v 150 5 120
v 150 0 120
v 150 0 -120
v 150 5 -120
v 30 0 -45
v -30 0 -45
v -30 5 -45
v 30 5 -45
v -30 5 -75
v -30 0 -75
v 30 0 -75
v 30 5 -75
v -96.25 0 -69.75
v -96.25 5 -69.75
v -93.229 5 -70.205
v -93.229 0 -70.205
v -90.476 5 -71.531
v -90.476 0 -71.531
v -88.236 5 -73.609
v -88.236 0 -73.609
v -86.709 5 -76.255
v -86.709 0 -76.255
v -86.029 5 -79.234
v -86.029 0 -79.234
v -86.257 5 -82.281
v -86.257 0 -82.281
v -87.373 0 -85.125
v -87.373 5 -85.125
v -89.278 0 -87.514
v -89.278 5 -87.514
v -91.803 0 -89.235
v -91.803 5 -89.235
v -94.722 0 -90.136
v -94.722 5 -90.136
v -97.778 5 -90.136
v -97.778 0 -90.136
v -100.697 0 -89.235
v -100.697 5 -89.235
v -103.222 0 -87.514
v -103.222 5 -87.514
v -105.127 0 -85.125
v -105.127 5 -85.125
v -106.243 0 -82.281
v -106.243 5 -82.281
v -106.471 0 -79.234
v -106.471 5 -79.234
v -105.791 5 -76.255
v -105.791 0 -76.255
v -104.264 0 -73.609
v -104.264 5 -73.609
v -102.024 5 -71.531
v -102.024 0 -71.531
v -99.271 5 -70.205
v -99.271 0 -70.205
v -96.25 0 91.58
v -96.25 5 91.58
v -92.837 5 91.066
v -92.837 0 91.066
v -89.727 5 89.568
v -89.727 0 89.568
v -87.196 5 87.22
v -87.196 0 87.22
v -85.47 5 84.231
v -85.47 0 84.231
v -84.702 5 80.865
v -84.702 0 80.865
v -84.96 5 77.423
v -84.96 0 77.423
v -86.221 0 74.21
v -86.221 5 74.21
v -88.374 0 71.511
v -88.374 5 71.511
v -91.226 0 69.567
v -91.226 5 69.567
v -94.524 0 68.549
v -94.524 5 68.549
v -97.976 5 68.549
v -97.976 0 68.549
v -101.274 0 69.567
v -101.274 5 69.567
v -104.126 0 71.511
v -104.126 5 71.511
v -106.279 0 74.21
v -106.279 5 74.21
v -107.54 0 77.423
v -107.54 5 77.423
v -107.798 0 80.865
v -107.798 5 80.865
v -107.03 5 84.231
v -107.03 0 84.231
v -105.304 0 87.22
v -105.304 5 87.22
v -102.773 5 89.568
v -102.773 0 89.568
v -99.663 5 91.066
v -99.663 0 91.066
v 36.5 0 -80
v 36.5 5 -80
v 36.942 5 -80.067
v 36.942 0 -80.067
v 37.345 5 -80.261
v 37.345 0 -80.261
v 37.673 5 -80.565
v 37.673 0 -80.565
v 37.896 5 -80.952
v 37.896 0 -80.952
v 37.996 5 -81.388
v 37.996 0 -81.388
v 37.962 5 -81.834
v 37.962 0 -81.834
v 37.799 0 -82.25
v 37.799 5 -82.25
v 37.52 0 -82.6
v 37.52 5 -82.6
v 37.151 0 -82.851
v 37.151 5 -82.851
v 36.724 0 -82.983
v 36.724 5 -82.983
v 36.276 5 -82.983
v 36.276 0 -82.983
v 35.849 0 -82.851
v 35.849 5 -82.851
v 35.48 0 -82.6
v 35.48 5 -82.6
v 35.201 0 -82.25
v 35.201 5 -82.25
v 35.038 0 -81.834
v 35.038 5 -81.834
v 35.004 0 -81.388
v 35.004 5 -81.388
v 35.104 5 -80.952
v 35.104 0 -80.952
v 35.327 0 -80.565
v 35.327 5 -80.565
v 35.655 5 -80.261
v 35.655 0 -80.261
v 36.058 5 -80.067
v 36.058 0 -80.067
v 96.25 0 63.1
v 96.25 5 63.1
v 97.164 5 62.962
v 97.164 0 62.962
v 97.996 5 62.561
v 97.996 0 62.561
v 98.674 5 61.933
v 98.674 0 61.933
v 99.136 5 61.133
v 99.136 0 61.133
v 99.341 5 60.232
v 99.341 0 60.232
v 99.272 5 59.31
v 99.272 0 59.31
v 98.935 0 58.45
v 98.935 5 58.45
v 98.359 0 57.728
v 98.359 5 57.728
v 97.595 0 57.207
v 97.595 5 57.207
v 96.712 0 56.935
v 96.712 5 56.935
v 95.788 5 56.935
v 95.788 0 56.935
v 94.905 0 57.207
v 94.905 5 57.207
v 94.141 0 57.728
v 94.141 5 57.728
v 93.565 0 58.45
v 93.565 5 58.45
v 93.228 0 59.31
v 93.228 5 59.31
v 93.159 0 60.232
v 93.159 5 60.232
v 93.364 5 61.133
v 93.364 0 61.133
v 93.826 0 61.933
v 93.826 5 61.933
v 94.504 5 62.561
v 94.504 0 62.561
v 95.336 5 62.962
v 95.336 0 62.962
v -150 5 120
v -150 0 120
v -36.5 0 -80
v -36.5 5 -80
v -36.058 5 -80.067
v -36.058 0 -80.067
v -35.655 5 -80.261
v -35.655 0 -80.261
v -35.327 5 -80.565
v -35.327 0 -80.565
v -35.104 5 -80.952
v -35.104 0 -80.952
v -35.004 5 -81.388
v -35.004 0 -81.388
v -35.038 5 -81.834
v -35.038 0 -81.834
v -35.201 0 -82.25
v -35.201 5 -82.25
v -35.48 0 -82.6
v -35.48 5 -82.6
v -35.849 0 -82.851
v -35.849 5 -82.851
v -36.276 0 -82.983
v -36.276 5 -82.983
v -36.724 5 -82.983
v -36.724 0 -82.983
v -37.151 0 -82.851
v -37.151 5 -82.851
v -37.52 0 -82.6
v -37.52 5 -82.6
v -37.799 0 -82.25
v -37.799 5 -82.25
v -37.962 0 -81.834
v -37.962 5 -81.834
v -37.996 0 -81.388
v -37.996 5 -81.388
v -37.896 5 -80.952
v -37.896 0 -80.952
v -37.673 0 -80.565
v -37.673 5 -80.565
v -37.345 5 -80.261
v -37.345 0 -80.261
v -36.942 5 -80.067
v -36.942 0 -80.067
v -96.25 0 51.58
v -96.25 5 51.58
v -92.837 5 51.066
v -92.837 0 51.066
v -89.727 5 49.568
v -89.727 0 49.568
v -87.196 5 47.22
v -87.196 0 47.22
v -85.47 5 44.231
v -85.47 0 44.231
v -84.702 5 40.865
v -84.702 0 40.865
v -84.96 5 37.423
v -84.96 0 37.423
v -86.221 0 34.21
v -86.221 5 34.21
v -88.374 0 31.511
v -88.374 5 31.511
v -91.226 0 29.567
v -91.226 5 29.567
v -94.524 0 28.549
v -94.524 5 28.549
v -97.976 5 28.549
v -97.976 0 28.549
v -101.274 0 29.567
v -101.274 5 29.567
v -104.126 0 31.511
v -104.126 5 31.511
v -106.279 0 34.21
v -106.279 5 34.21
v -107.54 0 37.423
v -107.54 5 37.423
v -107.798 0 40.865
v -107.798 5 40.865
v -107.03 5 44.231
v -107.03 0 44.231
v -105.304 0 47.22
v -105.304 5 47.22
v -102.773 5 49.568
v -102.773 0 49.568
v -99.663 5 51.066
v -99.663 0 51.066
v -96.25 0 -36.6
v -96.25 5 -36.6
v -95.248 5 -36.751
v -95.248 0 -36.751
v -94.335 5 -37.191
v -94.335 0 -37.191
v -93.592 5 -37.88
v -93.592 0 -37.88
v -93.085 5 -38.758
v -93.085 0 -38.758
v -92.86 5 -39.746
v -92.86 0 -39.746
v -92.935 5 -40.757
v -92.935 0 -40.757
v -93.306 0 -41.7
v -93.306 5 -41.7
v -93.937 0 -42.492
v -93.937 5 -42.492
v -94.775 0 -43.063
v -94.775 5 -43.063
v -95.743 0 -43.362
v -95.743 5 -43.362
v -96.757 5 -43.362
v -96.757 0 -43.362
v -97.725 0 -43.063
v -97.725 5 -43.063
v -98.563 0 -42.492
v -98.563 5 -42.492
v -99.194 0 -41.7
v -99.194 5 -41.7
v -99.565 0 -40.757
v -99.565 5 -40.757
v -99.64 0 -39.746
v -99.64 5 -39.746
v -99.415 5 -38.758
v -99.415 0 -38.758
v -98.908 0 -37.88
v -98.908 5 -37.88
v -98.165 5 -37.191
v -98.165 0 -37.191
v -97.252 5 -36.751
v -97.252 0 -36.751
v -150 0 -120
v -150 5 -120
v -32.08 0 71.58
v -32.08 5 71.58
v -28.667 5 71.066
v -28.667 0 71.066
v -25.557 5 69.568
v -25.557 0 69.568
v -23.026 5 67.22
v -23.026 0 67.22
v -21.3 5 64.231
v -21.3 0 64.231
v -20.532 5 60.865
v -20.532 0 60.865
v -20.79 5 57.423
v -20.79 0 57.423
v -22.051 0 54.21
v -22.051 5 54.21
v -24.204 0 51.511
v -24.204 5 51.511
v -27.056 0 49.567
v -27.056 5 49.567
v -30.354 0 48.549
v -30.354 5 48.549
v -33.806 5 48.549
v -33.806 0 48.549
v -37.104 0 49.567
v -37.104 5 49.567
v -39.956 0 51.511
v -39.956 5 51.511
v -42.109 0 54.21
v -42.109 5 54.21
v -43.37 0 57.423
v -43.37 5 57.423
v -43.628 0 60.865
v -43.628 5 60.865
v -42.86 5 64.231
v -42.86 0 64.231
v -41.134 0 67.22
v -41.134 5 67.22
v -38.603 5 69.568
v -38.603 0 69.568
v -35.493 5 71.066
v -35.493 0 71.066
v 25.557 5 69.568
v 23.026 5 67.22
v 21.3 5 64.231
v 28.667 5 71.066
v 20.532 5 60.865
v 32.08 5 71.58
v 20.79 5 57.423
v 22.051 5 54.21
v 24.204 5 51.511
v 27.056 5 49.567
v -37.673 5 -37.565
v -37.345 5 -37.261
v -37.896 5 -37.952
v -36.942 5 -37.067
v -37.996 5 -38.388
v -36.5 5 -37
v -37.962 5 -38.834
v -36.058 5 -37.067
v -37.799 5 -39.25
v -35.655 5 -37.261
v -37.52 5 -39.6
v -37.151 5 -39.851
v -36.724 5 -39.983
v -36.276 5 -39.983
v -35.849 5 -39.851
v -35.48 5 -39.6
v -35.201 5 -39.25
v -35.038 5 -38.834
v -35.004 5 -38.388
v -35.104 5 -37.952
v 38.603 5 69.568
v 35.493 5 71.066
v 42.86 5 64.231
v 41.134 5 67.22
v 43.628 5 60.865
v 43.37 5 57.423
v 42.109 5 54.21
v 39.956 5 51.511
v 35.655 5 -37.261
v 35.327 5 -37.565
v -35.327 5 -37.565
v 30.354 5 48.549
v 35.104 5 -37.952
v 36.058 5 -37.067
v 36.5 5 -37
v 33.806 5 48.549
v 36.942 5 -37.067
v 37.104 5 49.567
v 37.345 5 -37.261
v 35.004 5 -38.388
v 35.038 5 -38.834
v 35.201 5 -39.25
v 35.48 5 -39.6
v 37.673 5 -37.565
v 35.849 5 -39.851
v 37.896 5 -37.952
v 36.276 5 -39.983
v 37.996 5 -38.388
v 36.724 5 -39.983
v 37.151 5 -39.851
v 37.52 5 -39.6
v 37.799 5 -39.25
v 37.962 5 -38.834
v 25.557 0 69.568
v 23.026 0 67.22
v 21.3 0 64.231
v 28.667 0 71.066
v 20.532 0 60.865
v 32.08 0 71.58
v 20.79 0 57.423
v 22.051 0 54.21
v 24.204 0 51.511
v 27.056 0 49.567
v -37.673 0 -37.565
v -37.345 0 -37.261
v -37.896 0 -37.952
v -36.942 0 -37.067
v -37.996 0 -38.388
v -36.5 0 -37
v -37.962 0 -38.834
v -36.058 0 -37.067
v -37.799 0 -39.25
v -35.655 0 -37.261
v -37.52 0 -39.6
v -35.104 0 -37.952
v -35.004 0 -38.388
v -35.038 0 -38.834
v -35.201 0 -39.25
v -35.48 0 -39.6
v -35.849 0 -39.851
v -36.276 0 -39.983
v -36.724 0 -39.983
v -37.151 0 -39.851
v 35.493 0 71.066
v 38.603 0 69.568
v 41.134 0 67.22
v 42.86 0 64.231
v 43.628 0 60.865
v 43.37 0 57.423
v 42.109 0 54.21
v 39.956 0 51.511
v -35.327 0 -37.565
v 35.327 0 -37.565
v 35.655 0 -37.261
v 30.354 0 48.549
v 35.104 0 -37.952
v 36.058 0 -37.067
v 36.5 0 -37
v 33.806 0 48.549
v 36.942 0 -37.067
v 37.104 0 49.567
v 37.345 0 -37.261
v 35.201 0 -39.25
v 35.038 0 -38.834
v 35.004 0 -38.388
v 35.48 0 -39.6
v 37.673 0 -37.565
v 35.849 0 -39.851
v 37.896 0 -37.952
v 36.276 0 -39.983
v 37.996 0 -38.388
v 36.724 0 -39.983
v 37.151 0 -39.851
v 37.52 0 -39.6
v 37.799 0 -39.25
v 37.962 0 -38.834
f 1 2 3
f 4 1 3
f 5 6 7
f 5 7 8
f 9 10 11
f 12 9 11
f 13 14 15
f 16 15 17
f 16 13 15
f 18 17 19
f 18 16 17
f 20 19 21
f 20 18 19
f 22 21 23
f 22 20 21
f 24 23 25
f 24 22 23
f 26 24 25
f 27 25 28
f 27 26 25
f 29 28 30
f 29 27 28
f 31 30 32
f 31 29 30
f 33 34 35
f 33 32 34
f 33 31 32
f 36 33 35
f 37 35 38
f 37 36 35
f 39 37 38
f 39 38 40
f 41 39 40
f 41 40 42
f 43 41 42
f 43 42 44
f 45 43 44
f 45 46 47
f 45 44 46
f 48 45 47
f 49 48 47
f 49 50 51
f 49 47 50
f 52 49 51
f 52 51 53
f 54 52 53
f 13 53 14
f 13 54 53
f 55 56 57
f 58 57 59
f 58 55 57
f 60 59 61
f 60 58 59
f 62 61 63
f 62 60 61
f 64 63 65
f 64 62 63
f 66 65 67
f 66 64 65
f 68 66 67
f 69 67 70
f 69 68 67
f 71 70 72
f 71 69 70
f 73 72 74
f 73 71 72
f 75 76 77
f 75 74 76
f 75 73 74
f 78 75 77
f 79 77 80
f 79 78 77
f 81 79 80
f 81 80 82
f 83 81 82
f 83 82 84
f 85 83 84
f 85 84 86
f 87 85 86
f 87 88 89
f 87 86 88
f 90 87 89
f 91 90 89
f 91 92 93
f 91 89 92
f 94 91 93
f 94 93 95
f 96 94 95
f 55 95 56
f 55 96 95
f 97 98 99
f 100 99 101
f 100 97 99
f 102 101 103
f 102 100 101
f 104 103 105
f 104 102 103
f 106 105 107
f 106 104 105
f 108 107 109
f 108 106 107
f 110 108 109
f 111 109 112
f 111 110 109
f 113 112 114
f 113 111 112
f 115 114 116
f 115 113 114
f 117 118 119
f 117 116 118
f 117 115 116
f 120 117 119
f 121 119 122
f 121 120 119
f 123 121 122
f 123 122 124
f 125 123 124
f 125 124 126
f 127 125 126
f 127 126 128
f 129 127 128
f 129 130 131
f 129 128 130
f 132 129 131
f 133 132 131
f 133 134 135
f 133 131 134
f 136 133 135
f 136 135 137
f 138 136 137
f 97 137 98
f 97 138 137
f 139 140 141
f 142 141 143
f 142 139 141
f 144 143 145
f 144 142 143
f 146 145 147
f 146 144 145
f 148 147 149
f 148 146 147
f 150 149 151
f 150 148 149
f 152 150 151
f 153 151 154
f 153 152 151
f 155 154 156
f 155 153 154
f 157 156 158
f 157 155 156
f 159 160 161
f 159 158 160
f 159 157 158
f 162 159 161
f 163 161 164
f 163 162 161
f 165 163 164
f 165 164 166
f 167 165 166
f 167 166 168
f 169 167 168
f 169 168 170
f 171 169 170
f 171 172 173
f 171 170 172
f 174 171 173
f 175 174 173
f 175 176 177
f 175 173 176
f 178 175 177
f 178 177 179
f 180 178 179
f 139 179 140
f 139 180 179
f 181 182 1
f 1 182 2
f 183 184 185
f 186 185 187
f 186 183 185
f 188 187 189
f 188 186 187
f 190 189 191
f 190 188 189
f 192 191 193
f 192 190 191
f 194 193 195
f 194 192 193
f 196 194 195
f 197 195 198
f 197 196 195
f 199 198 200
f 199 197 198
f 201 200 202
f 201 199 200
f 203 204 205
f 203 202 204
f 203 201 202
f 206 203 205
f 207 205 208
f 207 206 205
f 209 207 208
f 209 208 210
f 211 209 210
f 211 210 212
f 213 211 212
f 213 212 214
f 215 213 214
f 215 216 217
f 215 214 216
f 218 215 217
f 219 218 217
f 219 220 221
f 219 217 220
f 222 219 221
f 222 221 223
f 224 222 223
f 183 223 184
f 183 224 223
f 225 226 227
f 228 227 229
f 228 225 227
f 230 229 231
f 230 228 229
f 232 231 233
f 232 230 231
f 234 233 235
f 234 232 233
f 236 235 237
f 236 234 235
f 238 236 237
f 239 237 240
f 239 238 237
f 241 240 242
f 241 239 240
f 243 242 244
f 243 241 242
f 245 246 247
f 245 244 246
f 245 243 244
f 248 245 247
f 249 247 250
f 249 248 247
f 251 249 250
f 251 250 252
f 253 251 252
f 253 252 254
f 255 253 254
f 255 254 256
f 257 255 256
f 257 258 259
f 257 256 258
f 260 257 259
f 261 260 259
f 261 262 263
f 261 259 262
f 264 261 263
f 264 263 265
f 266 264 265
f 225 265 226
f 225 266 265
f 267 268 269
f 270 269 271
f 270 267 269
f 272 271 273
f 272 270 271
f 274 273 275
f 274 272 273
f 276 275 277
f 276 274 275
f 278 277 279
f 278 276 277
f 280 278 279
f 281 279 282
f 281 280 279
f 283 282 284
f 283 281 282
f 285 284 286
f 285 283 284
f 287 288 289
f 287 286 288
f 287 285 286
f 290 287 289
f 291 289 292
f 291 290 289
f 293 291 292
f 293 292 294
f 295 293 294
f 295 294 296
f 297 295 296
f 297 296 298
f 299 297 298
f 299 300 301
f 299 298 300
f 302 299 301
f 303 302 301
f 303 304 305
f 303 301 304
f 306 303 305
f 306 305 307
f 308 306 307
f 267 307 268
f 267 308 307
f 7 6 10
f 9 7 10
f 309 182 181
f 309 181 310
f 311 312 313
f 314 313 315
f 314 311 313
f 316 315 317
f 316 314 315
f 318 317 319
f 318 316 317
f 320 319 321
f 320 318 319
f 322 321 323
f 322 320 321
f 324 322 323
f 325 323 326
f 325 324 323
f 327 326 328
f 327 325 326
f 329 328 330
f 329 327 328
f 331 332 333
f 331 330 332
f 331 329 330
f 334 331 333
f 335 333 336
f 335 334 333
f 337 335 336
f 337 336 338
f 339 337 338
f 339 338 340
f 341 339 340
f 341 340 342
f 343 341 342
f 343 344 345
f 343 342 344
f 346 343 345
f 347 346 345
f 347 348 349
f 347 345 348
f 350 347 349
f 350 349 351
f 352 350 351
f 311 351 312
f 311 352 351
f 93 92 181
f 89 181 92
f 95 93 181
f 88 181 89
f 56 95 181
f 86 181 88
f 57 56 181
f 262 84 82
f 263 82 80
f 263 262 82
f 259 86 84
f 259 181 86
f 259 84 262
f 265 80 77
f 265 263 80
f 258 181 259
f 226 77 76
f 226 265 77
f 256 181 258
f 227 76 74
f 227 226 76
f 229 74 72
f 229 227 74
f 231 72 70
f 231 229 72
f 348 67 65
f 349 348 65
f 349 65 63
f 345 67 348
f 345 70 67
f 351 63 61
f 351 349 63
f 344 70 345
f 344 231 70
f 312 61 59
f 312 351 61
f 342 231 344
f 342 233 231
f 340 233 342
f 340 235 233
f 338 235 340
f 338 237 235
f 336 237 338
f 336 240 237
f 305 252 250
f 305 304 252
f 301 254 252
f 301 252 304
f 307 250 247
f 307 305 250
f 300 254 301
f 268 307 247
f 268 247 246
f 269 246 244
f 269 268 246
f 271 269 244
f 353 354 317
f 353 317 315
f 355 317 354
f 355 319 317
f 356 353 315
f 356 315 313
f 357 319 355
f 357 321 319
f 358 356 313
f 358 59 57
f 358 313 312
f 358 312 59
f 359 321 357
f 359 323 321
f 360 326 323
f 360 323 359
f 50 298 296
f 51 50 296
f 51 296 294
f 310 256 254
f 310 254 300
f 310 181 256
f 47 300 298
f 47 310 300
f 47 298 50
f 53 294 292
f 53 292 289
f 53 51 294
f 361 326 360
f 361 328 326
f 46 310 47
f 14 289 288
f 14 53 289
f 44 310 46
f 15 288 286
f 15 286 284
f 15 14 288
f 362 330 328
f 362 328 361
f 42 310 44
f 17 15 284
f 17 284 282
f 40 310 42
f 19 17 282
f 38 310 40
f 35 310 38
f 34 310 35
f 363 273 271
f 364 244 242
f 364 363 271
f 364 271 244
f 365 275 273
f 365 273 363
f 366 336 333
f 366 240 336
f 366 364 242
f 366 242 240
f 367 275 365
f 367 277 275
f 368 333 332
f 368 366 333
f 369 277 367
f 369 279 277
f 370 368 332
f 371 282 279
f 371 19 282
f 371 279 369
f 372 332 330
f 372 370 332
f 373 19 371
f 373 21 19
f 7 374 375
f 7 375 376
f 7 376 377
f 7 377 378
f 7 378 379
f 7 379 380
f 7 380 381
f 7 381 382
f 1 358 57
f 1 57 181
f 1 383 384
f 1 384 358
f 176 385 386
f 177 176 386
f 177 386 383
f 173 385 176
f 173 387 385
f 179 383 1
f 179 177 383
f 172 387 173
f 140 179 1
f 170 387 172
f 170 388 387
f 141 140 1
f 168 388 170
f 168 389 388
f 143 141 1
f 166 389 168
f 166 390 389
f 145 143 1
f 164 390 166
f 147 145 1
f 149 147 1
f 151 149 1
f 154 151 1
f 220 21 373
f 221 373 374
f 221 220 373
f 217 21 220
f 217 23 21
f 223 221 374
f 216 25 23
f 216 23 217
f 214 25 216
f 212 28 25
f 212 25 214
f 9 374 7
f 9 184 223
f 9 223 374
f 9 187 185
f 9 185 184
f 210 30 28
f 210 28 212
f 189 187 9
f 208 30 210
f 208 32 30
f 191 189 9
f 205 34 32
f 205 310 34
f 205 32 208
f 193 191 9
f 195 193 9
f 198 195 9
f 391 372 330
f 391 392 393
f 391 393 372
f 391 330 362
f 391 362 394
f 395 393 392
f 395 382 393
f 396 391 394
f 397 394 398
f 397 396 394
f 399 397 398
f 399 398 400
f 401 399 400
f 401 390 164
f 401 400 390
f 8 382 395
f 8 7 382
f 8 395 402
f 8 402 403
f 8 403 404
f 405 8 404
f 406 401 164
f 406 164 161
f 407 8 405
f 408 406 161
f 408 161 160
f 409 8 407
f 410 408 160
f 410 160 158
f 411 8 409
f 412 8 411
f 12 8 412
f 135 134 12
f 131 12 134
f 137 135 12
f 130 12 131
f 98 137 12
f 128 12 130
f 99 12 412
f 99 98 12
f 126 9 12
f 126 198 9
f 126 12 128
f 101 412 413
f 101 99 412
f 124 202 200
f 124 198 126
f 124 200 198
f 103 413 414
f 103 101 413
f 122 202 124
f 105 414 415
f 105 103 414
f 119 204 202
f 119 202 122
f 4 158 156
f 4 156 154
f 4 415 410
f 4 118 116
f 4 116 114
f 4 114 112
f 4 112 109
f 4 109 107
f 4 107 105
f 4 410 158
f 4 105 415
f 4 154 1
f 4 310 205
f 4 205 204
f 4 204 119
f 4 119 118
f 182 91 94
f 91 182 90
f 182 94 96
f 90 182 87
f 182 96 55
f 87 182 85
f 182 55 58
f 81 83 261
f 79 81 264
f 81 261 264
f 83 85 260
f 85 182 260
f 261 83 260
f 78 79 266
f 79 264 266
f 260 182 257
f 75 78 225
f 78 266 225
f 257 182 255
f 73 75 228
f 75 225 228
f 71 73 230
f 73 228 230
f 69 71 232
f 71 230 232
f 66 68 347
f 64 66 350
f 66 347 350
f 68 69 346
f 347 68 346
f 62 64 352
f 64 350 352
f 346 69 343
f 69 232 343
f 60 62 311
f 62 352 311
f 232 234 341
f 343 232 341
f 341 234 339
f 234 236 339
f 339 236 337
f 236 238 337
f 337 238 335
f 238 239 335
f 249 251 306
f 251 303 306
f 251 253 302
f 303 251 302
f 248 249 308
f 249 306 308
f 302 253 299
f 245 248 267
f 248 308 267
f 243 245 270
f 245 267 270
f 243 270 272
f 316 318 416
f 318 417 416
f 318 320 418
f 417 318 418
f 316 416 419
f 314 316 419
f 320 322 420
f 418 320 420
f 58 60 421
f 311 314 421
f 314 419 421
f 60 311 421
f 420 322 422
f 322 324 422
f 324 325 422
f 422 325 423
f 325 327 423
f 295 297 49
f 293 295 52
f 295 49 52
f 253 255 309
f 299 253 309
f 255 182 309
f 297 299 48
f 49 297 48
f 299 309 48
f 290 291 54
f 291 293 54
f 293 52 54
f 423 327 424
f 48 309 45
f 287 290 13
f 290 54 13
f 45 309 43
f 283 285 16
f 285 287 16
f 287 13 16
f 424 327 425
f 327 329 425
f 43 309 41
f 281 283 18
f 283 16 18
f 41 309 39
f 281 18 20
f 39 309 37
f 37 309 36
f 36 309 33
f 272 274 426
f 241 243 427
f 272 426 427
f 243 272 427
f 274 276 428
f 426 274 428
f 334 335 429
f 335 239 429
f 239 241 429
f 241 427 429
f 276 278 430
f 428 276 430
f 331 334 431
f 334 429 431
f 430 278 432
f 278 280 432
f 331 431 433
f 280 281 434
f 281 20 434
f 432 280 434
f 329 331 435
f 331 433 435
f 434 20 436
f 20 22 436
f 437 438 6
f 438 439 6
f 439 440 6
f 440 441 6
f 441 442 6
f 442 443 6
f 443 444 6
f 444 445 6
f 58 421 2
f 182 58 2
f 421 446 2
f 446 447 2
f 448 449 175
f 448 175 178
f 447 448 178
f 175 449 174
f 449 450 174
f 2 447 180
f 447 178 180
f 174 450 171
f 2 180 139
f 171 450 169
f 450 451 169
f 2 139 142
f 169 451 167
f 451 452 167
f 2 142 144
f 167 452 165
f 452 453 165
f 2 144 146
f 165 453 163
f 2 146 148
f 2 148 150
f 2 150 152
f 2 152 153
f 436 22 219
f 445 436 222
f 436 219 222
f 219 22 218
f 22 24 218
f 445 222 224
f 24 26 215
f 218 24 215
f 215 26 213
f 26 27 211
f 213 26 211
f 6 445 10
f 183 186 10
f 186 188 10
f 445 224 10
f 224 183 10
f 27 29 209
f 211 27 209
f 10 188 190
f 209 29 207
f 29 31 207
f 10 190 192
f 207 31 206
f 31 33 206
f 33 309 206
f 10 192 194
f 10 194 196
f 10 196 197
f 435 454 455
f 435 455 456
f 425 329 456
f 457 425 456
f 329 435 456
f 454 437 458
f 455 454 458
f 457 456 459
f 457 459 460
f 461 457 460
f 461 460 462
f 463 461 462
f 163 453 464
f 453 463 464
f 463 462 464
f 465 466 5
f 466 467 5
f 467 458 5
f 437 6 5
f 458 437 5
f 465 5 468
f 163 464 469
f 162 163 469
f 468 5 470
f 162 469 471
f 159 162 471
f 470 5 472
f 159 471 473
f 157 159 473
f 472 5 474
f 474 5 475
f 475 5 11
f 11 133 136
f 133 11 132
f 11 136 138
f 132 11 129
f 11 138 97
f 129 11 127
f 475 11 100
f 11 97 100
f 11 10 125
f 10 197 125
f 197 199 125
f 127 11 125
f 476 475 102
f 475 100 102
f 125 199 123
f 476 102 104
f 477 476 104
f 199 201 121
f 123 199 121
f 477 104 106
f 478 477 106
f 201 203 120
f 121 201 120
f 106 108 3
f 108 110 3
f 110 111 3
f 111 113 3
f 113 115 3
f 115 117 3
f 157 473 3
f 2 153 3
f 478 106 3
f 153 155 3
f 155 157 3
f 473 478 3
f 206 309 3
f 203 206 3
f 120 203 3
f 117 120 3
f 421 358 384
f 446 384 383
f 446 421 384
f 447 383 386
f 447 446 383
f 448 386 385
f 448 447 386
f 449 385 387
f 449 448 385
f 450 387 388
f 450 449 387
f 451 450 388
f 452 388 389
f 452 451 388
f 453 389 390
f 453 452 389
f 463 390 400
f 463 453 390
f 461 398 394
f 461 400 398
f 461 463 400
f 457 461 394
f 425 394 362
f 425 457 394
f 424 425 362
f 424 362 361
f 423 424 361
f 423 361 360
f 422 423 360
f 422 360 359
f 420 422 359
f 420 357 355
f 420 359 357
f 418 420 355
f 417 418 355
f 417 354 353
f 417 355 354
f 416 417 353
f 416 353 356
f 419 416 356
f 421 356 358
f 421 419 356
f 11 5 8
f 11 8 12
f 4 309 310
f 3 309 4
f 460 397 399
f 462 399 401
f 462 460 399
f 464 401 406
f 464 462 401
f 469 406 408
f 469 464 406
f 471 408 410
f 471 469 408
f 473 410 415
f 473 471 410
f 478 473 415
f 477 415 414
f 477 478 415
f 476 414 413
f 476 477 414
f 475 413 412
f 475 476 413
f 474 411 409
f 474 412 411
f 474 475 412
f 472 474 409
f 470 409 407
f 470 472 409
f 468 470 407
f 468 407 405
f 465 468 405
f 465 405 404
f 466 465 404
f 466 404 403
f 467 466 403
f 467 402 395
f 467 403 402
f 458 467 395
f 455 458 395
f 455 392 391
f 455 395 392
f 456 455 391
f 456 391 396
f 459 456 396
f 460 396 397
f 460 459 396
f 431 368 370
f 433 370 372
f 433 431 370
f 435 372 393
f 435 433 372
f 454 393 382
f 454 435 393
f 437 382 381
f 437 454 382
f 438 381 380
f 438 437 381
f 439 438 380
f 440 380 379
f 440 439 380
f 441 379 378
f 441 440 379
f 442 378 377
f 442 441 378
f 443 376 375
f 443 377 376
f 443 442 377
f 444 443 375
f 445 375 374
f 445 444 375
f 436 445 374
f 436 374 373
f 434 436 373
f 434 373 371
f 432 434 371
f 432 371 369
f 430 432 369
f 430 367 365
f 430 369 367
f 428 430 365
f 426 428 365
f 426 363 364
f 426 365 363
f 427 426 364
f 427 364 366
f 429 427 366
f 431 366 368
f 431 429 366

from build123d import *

# Parameters (mm, degrees)
SKETCH1_W           = 300
SKETCH1_H           = 240
BOSS_EXTRUDE1_DEPTH = 5
SKETCH2_R           = 10.25
SKETCH2_R_2         = 11.58
SKETCH2_R_3         = 3.4
SKETCH2_R_4         = 3.1
SKETCH2_R_5         = 1.5
SKETCH2_W           = 60
SKETCH2_H           = 30
CUT_EXTRUDE4_DEPTH  = 193.158788506


with BuildPart() as part:
    # Sketch1 → Boss-Extrude1 (new body)
    with BuildSketch(Plane(origin=(0, 0, 0), x_dir=(1, 0, 0), z_dir=(0, 1, 0))):
        Rectangle(SKETCH1_W, SKETCH1_H)
    extrude(amount=BOSS_EXTRUDE1_DEPTH)

    # Sketch2 → Cut-Extrude4 (cut, through all)
    with BuildSketch(Plane(origin=(0, 0, 0), x_dir=(1, 0, 0), z_dir=(0, 1, 0))):
        with Locations(Location((-96.25, 80, 0), (0, 0, 270))):
            Circle(SKETCH2_R)
        with Locations(Location((-96.25, -40, 0), (0, 0, 270))):
            Circle(SKETCH2_R_2)
        with Locations(Location((-96.25, -80, 0), (0, 0, 270))):
            Circle(SKETCH2_R_2)
        with Locations(Location((-96.25, 40, 0), (0, 0, 270))):
            Circle(SKETCH2_R_3)
        with Locations(Location((-32.08, -60, 0), (0, 0, 270))):
            Circle(SKETCH2_R_2)
        with Locations(Location((32.08, -60, 0), (0, 0, 270))):
            Circle(SKETCH2_R_2)
        with Locations(Location((96.25, -60, 0), (0, 0, 270))):
            Circle(SKETCH2_R_4)
        with Locations(Location((36.5, 38.5, 0), (0, 0, 270))):
            Circle(SKETCH2_R_5)
        with Locations(Location((36.5, 81.5, 0), (0, 0, 270))):
            Circle(SKETCH2_R_5)
        with Locations(Location((-36.5, 81.5, 0), (0, 0, 270))):
            Circle(SKETCH2_R_5)
        with Locations(Location((-36.5, 38.5, 0), (0, 0, 270))):
            Circle(SKETCH2_R_5)
        with Locations((0, 60)):
            Rectangle(SKETCH2_W, SKETCH2_H)
    extrude(amount=CUT_EXTRUDE4_DEPTH, mode=Mode.SUBTRACT)


solid = part.part
